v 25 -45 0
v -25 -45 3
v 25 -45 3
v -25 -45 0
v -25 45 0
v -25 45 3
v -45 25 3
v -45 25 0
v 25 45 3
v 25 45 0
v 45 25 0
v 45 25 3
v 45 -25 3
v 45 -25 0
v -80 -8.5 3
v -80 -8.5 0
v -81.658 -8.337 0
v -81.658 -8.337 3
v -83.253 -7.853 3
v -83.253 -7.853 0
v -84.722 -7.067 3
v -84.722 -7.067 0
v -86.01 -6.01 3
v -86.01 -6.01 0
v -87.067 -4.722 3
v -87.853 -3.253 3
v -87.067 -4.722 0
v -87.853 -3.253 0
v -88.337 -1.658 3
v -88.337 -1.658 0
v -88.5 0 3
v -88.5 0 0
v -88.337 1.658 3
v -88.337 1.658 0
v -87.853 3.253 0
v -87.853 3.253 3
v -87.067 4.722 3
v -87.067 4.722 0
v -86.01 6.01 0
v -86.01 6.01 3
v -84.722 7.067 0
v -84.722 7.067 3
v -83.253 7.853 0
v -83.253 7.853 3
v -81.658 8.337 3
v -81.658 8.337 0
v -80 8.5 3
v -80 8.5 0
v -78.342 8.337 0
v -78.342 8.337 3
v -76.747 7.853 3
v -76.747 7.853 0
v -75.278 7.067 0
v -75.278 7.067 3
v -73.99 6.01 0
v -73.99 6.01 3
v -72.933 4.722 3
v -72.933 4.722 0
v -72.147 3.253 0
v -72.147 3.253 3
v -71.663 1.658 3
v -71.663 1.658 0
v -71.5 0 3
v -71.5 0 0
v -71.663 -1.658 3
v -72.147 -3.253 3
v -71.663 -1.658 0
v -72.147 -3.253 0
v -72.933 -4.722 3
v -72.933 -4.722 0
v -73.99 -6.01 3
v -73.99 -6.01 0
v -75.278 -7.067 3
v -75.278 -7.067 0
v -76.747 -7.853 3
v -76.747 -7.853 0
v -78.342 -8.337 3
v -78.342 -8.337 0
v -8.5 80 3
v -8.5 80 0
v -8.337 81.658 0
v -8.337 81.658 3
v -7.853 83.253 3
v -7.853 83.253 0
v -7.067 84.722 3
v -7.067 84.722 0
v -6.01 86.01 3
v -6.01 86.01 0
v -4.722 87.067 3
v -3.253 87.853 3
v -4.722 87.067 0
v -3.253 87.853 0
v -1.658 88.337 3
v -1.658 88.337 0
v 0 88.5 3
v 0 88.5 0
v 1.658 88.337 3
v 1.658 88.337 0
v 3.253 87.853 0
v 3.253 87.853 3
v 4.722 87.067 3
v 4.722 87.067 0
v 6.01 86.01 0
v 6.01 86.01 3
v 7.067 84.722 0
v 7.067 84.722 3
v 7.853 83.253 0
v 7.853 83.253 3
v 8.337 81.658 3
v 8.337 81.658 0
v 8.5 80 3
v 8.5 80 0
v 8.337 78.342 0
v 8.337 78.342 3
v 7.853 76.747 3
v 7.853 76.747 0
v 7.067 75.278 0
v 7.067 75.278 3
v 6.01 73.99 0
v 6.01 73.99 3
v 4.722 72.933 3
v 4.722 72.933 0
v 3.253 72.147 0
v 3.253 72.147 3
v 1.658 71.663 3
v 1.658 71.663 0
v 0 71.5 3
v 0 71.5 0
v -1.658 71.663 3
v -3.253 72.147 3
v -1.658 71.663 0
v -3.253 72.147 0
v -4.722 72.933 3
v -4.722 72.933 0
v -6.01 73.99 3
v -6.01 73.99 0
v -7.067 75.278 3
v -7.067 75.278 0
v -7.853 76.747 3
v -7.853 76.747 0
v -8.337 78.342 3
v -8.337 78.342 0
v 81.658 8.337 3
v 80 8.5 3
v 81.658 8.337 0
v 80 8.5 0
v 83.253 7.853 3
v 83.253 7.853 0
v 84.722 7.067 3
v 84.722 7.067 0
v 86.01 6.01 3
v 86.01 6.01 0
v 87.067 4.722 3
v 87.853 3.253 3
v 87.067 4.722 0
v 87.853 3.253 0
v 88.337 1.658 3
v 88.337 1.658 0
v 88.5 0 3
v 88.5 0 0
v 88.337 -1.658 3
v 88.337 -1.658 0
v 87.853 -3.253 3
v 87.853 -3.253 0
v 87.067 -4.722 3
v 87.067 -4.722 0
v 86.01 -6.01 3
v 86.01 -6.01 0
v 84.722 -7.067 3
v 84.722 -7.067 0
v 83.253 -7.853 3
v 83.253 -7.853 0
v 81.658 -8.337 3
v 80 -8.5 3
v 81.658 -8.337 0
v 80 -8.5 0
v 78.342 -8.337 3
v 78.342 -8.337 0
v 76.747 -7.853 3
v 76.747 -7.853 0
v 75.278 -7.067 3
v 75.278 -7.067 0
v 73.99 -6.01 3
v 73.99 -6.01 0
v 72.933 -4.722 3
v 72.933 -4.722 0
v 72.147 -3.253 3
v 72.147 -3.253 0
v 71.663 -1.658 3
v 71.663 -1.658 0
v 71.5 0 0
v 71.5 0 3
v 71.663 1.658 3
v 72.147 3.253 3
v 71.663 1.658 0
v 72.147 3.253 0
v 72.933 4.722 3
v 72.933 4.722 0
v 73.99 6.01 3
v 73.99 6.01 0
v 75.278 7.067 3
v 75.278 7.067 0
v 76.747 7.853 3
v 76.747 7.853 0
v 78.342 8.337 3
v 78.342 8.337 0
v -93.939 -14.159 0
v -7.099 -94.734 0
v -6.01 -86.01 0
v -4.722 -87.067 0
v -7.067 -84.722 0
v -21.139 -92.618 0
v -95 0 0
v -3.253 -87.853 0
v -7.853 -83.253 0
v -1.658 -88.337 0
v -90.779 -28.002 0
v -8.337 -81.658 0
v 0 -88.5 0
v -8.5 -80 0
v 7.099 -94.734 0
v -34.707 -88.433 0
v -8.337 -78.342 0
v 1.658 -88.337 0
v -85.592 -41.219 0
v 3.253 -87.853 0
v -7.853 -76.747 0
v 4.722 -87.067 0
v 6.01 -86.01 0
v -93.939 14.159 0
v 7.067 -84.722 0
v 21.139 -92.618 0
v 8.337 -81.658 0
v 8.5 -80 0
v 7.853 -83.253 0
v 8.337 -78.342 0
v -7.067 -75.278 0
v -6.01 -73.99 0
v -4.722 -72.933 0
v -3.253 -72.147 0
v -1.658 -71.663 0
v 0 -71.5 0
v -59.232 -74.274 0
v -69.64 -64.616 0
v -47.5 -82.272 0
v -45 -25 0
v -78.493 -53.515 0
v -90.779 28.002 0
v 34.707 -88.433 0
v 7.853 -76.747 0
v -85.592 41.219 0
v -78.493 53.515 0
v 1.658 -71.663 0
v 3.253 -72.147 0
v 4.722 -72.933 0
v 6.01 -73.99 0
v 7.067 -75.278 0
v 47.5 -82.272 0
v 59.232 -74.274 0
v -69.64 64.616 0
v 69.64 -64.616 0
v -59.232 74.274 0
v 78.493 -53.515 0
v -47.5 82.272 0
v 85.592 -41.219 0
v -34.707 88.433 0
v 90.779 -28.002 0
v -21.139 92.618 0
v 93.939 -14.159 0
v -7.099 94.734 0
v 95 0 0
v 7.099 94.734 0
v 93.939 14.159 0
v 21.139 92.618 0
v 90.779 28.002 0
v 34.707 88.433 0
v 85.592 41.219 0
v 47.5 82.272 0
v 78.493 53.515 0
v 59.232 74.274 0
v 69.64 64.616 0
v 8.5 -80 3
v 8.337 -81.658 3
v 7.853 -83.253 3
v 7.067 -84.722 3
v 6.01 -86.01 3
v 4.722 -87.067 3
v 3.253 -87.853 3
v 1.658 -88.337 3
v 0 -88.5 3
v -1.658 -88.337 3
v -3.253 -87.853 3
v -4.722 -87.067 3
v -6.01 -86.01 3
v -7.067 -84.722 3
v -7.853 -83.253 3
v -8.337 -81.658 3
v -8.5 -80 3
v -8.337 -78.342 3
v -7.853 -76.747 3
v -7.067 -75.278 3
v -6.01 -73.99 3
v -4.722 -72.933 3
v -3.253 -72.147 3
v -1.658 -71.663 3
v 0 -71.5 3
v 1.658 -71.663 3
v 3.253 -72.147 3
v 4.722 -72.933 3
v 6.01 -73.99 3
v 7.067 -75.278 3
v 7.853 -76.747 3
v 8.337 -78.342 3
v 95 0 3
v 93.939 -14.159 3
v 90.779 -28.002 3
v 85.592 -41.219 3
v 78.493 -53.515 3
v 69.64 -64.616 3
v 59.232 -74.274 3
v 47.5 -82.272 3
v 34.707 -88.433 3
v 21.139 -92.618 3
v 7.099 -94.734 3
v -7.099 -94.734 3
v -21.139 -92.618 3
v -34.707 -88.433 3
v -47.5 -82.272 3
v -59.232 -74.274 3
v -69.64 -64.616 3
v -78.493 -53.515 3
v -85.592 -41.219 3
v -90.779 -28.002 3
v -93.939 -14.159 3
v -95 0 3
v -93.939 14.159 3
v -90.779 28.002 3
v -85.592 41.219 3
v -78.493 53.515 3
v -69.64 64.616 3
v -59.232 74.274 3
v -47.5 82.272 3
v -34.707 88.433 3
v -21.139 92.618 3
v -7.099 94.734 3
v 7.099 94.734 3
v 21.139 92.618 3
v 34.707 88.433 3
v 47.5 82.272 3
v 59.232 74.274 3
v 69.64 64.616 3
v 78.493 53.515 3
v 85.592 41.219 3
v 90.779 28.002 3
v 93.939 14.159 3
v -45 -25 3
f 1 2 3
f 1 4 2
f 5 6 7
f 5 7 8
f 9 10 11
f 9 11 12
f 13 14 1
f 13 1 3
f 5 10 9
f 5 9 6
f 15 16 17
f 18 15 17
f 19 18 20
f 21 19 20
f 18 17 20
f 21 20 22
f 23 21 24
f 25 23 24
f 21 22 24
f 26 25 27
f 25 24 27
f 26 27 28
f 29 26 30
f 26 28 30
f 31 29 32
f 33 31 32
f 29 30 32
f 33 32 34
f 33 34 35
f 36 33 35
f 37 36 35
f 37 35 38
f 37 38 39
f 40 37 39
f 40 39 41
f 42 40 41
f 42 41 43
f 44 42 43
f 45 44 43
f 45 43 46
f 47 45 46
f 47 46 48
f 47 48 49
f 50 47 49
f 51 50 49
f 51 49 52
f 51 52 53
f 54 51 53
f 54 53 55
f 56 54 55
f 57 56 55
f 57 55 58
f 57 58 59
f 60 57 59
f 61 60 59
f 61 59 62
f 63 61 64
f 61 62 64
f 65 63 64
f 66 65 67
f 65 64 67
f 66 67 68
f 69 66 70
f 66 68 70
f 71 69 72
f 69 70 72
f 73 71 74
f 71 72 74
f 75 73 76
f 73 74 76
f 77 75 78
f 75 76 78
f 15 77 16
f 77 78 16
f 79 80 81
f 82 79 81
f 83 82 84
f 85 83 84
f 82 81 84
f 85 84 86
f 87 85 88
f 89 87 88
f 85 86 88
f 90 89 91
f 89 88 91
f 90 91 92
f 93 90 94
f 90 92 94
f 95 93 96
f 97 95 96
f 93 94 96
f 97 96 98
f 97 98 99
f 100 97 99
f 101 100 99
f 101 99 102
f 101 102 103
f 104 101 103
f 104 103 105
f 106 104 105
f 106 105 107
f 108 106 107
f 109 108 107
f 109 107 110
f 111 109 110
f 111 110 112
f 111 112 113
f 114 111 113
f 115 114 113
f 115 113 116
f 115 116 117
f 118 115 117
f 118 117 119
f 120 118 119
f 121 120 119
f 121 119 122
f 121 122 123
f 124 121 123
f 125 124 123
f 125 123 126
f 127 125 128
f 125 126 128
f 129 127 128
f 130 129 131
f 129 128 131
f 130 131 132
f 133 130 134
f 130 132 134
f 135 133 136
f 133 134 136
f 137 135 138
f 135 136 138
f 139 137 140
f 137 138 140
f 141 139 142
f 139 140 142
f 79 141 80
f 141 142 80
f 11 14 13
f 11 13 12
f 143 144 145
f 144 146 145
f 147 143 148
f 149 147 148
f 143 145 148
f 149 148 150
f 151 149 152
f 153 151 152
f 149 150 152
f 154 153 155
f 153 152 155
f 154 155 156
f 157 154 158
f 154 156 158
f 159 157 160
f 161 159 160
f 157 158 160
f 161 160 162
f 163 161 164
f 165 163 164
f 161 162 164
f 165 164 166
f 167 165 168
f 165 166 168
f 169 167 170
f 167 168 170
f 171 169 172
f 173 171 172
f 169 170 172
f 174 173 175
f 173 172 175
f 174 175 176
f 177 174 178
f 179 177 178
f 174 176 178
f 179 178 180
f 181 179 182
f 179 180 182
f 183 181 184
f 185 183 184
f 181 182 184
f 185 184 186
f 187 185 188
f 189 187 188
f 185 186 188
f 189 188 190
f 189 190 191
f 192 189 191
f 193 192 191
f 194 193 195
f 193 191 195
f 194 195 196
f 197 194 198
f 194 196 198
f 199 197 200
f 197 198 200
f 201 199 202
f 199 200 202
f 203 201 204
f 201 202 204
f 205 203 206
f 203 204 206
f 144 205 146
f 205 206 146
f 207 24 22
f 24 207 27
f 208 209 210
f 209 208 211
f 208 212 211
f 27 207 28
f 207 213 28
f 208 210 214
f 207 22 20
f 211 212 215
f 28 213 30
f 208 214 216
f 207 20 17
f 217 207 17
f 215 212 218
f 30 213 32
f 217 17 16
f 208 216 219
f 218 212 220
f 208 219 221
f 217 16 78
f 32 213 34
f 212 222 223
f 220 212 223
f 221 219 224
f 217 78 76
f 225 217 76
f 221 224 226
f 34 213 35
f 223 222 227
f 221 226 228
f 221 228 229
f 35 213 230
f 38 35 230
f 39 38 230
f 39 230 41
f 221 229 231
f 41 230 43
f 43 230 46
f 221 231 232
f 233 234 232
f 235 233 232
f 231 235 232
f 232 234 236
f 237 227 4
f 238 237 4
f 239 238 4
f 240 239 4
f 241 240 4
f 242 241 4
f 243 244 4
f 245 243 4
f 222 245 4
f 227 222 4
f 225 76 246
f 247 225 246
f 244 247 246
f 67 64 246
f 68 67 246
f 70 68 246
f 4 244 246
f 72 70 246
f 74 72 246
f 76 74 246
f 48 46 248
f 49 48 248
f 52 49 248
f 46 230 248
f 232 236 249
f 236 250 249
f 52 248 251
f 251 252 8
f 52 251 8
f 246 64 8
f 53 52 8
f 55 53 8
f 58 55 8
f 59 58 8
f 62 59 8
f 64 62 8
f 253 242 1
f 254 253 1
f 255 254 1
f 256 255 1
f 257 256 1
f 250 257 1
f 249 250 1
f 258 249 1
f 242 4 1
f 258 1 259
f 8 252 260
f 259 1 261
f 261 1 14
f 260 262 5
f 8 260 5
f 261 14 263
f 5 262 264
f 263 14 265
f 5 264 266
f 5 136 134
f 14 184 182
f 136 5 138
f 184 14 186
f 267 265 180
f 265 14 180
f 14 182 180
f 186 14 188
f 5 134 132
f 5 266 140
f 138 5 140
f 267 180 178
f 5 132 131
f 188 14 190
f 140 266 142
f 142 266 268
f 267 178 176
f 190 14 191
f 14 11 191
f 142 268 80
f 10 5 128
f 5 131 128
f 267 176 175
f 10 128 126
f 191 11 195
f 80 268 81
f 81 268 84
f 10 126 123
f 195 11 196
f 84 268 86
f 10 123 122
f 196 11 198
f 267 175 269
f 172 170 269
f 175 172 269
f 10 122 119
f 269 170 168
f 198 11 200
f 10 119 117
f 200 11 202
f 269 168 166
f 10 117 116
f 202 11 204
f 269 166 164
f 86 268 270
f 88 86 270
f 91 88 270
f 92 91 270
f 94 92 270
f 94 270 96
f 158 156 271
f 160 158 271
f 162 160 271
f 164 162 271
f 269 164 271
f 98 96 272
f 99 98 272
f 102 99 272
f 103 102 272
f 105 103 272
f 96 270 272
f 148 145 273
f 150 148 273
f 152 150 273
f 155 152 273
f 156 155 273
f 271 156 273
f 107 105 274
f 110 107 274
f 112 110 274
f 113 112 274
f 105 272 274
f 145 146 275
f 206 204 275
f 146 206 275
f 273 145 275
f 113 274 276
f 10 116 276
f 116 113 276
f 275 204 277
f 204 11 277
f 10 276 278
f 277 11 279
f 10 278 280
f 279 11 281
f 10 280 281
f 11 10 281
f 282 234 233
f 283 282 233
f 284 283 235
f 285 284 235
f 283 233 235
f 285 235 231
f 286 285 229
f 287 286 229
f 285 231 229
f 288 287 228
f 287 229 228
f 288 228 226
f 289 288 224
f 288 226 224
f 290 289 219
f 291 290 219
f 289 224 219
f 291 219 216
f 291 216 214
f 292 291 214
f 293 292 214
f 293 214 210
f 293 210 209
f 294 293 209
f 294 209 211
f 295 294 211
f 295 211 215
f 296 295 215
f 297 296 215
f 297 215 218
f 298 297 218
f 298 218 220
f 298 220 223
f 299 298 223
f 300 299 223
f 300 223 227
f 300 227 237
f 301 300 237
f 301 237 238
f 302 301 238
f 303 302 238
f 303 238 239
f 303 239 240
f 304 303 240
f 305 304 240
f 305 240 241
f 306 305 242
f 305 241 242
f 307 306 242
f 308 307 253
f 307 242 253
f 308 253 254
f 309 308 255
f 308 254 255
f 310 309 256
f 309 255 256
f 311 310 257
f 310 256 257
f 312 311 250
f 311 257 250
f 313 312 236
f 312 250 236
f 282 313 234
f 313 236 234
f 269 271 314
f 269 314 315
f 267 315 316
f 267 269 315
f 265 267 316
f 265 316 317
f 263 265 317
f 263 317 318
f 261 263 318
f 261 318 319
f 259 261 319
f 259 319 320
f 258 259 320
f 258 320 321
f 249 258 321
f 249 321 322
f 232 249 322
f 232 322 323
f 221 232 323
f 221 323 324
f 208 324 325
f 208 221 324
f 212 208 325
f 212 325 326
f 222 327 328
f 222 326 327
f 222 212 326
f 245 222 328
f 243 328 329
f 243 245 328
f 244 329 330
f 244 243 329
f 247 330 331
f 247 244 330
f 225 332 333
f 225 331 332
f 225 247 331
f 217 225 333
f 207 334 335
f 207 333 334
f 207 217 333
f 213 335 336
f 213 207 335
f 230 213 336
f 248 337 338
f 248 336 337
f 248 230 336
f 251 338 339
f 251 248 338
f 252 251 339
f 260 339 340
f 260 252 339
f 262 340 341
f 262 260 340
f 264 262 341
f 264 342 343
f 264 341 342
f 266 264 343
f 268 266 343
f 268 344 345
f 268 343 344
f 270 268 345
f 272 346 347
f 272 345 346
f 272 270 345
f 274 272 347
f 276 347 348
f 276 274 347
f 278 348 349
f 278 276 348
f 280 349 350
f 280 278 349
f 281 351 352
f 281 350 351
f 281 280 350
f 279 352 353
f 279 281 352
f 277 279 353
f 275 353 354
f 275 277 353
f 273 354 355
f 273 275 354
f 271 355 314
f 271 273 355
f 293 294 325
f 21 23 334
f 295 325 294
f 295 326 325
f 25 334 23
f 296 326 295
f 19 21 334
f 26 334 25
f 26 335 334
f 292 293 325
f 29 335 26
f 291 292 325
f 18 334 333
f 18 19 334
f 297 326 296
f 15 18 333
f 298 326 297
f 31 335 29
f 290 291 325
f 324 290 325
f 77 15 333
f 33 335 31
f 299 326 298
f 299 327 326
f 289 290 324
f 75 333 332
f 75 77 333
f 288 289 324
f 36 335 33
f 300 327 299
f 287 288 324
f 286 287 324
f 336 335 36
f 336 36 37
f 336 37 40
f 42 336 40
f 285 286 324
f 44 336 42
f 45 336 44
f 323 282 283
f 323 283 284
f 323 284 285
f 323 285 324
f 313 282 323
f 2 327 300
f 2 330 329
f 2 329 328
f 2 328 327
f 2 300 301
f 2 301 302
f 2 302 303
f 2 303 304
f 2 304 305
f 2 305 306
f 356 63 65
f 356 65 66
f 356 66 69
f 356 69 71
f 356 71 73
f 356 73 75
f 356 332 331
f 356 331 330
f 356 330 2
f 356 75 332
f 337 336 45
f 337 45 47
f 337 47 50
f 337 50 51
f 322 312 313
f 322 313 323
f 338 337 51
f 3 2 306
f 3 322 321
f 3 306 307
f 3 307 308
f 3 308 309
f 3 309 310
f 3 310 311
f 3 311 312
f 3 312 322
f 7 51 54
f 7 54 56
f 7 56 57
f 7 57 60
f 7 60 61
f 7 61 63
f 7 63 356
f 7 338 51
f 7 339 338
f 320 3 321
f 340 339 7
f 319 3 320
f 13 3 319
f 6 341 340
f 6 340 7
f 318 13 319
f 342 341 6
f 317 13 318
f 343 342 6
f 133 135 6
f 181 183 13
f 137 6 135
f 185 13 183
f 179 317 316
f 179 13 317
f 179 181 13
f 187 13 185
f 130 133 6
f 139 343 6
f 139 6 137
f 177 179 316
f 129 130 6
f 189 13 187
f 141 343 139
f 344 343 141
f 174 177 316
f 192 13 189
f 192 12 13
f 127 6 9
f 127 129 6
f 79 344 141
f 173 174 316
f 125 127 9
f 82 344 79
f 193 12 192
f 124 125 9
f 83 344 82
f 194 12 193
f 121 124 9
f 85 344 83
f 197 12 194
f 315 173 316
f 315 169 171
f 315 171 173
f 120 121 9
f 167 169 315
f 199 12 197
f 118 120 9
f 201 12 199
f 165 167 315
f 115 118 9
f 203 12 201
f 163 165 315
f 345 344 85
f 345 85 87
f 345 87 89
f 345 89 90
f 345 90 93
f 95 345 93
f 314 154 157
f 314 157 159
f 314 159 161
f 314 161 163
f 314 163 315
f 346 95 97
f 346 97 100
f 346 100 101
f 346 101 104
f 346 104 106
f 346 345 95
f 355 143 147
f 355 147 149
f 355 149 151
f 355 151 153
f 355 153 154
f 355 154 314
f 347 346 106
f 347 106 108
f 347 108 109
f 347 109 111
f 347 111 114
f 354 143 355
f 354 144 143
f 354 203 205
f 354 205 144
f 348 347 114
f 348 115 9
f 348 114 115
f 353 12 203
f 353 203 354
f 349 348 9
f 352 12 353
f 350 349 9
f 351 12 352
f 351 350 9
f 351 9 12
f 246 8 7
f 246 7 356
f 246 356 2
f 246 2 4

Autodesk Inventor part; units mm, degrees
ref_plane "YZ Plane" through (0, 0, 0) normal (1, 0, 0) x (0, 1, 0)
ref_plane "XZ Plane" through (0, 0, 0) normal (0, 1, 0) x (-1, 0, 0)
ref_plane "XY Plane" through (0, 0, 0) normal (0, 0, 1) x (1, 0, 0)
sketch "Sketch1" plane through (0, 0, 0) normal (0, 0, 1) x (1, 0, 0)
  circle A0 centre (0, 0) radius 95
  line L0 (45, 45) -> (-45, 45)
  line L1 (-45, 45) -> (-45, -45)
  line L2 (-45, -45) -> (45, -45)
  line L3 (45, -45) -> (45, 45)
  line L4 (45, 45) -> (-45, -45) construction
  line L5 (-45, 45) -> (45, -45) construction
  dimension "d157" = 190
  dimension "d158" = 90
  dimension "d159" = 90
extrude "Plate5" add sketch "Sketch1" along normal blind 3
sketch "Sketch7" plane through (0, 0, 0) normal (0, 0, -1) x (-1, 0, 0)
  circle A0 centre (0, 80) radius 8.5
  point P0 (0, 0)
  dimension "d160" = 17
  dimension "d161" = 80
extrude "Cut1" cut sketch "Sketch7" against normal blind 3
pattern_circular "Circular Pattern1" count 4 over 360 about axis through (0, 0, -10) along (0, 0, 1) of "Cut1"
chamfer "Corner Chamfer2" distance 20 angle 45 4 edges at (-45, -45, 1.5) (45, -45, 1.5) (-45, 45, 1.5) (45, 45, 1.5)
properties part number "PNS 1651 FDS MAIN  FLANGE" material "Stainless Steel"
